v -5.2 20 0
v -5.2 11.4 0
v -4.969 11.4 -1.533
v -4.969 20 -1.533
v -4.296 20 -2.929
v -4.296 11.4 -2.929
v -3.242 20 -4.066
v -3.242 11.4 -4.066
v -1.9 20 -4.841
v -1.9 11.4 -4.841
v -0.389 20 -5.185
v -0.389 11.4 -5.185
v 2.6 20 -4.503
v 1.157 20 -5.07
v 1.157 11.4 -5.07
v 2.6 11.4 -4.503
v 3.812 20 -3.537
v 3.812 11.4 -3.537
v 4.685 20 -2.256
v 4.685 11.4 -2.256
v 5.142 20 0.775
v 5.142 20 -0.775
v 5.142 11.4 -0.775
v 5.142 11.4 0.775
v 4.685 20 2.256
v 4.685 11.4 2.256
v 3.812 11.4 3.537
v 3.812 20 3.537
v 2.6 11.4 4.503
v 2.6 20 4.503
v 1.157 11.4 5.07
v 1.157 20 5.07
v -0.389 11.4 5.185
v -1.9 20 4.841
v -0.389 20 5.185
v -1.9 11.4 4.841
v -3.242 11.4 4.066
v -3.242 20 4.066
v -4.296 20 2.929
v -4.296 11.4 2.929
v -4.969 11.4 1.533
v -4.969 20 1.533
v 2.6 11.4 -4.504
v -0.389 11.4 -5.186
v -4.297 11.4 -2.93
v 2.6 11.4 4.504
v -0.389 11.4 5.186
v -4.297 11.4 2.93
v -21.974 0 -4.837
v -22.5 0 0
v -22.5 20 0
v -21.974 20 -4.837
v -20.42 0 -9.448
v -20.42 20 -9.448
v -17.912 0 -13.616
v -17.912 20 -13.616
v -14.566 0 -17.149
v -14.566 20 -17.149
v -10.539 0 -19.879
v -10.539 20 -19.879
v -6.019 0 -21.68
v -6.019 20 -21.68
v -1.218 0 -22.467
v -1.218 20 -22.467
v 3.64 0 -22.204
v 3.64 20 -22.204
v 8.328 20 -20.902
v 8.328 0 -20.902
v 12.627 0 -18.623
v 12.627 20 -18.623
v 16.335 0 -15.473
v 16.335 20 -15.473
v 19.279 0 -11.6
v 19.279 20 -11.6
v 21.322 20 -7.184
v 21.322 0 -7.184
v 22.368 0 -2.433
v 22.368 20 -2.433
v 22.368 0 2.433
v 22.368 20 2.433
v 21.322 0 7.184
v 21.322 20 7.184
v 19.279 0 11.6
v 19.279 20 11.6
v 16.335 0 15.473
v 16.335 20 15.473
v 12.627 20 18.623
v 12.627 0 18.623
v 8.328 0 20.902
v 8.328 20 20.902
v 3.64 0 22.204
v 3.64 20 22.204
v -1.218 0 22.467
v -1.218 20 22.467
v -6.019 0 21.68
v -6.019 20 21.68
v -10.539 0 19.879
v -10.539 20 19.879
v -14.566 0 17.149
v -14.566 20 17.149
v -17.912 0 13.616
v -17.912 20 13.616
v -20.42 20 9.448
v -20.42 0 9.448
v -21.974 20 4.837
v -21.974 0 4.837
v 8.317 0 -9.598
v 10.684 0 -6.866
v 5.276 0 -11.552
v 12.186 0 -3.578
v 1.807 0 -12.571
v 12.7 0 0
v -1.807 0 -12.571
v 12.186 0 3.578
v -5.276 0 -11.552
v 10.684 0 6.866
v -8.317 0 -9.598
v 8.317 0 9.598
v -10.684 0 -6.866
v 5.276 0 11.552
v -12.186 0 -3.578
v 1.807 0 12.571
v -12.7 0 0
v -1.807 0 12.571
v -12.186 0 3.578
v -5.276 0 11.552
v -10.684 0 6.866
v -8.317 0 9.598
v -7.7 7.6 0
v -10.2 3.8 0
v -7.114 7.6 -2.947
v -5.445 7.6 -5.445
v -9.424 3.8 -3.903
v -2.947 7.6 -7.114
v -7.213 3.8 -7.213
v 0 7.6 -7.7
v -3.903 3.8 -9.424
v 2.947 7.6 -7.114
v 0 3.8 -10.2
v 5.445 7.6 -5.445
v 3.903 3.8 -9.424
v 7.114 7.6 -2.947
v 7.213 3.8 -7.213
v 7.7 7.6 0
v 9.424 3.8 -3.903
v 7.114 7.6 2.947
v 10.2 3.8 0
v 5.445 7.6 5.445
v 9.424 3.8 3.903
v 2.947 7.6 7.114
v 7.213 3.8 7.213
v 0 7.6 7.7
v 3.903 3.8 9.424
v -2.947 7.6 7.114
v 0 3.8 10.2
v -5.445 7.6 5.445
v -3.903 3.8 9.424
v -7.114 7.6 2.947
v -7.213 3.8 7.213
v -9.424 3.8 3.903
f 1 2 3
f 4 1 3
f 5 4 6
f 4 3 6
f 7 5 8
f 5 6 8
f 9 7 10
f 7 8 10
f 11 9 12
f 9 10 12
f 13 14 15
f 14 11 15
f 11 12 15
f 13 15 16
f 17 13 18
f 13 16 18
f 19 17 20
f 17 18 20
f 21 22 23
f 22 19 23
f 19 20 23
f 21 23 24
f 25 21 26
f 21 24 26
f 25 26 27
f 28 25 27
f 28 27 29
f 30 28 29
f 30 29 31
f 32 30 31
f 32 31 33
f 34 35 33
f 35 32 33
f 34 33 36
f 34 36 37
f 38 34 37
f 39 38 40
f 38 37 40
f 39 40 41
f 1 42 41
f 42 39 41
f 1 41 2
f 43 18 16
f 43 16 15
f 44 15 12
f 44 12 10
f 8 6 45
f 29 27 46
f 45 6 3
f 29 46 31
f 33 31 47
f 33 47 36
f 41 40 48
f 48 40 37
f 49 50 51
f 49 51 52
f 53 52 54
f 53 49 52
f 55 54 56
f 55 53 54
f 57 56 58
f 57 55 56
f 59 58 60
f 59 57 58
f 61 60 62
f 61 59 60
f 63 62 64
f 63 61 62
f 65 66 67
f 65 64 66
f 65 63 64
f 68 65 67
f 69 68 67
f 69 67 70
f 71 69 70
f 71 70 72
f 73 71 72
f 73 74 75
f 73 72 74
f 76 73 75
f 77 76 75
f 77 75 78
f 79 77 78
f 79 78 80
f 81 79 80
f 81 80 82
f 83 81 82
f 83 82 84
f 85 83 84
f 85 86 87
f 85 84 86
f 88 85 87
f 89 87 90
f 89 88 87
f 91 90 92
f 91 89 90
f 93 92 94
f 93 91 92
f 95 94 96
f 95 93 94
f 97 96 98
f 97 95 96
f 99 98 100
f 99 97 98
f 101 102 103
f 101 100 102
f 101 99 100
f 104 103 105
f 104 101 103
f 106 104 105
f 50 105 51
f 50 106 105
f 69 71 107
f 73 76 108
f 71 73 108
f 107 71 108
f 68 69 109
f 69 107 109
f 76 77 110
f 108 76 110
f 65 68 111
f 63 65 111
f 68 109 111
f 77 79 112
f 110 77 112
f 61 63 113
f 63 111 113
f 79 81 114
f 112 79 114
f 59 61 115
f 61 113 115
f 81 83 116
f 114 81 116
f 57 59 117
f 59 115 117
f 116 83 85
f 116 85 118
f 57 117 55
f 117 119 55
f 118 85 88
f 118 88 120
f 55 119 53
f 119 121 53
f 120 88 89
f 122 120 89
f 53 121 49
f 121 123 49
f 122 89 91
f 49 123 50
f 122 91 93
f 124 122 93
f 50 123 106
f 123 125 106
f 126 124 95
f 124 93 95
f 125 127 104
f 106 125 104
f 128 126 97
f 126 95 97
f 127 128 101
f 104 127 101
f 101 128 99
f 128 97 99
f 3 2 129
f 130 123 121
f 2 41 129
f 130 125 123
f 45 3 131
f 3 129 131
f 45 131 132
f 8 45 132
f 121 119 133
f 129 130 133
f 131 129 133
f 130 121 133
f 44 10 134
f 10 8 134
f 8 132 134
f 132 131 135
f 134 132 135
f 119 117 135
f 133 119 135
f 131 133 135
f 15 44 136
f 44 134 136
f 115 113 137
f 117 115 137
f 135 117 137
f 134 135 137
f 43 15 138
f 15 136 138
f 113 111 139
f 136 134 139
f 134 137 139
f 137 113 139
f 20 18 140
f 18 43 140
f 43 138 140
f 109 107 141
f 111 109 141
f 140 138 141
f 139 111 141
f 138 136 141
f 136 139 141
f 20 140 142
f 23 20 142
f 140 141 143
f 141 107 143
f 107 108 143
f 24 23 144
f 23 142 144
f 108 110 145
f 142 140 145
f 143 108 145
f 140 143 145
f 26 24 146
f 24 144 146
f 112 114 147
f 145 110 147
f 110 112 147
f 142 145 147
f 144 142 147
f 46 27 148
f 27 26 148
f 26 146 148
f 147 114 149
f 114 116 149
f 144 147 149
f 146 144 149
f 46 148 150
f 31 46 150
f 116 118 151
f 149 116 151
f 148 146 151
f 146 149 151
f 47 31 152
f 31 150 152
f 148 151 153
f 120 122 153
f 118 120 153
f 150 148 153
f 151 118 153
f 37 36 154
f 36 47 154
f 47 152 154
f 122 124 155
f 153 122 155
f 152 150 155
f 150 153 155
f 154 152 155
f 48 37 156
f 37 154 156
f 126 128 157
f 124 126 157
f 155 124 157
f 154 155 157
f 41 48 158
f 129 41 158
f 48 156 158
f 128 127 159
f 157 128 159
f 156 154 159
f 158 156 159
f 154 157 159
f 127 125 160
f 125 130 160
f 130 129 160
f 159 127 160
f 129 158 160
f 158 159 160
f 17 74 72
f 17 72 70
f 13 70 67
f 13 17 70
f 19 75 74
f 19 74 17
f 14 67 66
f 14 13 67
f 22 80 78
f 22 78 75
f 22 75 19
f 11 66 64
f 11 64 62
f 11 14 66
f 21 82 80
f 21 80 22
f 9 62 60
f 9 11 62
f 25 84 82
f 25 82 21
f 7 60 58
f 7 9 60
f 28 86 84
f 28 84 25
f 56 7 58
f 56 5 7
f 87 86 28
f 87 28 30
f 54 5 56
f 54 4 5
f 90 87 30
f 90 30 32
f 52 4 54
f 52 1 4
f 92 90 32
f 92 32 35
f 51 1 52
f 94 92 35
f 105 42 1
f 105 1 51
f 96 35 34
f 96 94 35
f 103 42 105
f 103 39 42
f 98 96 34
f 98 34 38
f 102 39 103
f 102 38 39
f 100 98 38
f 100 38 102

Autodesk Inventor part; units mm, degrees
ref_plane "YZ Plane" through (0, 0, 0) normal (1, 0, 0) x (0, 1, 0)
ref_plane "XZ Plane" through (0, 0, 0) normal (0, 1, 0) x (-1, 0, 0)
ref_plane "XY Plane" through (0, 0, 0) normal (0, 0, 1) x (1, 0, 0)
sketch "Sketch1" plane through (0, 0, 0) normal (0, 1, 0) x (-1, 0, 0)
  circle A0 centre (0, 0) radius 22.5
  circle A1 centre (0, 0) radius 12.7
  circle A2 centre (0, 0) radius 5.2
  dimension "d1" = 45
  dimension "d14" = 25.4
  dimension "d15" = 10.4
extrude "Extrusion1" add sketch "Sketch1" along normal blind 20 contours A0 | A1 | A2
extrude "Extrusion2" cut sketch "Sketch1" along normal blind 11.4 contours A1
extrude "Extrusion3" cut sketch "Sketch1" along normal blind 20 contours A2
chamfer "Chamfer2" distance 11.4 distance2 7.5 1 edges at (12.7, 11.4, 0) measured on face at (-12.5355, 7.6, -2.0372)
properties part number "4. ring"
